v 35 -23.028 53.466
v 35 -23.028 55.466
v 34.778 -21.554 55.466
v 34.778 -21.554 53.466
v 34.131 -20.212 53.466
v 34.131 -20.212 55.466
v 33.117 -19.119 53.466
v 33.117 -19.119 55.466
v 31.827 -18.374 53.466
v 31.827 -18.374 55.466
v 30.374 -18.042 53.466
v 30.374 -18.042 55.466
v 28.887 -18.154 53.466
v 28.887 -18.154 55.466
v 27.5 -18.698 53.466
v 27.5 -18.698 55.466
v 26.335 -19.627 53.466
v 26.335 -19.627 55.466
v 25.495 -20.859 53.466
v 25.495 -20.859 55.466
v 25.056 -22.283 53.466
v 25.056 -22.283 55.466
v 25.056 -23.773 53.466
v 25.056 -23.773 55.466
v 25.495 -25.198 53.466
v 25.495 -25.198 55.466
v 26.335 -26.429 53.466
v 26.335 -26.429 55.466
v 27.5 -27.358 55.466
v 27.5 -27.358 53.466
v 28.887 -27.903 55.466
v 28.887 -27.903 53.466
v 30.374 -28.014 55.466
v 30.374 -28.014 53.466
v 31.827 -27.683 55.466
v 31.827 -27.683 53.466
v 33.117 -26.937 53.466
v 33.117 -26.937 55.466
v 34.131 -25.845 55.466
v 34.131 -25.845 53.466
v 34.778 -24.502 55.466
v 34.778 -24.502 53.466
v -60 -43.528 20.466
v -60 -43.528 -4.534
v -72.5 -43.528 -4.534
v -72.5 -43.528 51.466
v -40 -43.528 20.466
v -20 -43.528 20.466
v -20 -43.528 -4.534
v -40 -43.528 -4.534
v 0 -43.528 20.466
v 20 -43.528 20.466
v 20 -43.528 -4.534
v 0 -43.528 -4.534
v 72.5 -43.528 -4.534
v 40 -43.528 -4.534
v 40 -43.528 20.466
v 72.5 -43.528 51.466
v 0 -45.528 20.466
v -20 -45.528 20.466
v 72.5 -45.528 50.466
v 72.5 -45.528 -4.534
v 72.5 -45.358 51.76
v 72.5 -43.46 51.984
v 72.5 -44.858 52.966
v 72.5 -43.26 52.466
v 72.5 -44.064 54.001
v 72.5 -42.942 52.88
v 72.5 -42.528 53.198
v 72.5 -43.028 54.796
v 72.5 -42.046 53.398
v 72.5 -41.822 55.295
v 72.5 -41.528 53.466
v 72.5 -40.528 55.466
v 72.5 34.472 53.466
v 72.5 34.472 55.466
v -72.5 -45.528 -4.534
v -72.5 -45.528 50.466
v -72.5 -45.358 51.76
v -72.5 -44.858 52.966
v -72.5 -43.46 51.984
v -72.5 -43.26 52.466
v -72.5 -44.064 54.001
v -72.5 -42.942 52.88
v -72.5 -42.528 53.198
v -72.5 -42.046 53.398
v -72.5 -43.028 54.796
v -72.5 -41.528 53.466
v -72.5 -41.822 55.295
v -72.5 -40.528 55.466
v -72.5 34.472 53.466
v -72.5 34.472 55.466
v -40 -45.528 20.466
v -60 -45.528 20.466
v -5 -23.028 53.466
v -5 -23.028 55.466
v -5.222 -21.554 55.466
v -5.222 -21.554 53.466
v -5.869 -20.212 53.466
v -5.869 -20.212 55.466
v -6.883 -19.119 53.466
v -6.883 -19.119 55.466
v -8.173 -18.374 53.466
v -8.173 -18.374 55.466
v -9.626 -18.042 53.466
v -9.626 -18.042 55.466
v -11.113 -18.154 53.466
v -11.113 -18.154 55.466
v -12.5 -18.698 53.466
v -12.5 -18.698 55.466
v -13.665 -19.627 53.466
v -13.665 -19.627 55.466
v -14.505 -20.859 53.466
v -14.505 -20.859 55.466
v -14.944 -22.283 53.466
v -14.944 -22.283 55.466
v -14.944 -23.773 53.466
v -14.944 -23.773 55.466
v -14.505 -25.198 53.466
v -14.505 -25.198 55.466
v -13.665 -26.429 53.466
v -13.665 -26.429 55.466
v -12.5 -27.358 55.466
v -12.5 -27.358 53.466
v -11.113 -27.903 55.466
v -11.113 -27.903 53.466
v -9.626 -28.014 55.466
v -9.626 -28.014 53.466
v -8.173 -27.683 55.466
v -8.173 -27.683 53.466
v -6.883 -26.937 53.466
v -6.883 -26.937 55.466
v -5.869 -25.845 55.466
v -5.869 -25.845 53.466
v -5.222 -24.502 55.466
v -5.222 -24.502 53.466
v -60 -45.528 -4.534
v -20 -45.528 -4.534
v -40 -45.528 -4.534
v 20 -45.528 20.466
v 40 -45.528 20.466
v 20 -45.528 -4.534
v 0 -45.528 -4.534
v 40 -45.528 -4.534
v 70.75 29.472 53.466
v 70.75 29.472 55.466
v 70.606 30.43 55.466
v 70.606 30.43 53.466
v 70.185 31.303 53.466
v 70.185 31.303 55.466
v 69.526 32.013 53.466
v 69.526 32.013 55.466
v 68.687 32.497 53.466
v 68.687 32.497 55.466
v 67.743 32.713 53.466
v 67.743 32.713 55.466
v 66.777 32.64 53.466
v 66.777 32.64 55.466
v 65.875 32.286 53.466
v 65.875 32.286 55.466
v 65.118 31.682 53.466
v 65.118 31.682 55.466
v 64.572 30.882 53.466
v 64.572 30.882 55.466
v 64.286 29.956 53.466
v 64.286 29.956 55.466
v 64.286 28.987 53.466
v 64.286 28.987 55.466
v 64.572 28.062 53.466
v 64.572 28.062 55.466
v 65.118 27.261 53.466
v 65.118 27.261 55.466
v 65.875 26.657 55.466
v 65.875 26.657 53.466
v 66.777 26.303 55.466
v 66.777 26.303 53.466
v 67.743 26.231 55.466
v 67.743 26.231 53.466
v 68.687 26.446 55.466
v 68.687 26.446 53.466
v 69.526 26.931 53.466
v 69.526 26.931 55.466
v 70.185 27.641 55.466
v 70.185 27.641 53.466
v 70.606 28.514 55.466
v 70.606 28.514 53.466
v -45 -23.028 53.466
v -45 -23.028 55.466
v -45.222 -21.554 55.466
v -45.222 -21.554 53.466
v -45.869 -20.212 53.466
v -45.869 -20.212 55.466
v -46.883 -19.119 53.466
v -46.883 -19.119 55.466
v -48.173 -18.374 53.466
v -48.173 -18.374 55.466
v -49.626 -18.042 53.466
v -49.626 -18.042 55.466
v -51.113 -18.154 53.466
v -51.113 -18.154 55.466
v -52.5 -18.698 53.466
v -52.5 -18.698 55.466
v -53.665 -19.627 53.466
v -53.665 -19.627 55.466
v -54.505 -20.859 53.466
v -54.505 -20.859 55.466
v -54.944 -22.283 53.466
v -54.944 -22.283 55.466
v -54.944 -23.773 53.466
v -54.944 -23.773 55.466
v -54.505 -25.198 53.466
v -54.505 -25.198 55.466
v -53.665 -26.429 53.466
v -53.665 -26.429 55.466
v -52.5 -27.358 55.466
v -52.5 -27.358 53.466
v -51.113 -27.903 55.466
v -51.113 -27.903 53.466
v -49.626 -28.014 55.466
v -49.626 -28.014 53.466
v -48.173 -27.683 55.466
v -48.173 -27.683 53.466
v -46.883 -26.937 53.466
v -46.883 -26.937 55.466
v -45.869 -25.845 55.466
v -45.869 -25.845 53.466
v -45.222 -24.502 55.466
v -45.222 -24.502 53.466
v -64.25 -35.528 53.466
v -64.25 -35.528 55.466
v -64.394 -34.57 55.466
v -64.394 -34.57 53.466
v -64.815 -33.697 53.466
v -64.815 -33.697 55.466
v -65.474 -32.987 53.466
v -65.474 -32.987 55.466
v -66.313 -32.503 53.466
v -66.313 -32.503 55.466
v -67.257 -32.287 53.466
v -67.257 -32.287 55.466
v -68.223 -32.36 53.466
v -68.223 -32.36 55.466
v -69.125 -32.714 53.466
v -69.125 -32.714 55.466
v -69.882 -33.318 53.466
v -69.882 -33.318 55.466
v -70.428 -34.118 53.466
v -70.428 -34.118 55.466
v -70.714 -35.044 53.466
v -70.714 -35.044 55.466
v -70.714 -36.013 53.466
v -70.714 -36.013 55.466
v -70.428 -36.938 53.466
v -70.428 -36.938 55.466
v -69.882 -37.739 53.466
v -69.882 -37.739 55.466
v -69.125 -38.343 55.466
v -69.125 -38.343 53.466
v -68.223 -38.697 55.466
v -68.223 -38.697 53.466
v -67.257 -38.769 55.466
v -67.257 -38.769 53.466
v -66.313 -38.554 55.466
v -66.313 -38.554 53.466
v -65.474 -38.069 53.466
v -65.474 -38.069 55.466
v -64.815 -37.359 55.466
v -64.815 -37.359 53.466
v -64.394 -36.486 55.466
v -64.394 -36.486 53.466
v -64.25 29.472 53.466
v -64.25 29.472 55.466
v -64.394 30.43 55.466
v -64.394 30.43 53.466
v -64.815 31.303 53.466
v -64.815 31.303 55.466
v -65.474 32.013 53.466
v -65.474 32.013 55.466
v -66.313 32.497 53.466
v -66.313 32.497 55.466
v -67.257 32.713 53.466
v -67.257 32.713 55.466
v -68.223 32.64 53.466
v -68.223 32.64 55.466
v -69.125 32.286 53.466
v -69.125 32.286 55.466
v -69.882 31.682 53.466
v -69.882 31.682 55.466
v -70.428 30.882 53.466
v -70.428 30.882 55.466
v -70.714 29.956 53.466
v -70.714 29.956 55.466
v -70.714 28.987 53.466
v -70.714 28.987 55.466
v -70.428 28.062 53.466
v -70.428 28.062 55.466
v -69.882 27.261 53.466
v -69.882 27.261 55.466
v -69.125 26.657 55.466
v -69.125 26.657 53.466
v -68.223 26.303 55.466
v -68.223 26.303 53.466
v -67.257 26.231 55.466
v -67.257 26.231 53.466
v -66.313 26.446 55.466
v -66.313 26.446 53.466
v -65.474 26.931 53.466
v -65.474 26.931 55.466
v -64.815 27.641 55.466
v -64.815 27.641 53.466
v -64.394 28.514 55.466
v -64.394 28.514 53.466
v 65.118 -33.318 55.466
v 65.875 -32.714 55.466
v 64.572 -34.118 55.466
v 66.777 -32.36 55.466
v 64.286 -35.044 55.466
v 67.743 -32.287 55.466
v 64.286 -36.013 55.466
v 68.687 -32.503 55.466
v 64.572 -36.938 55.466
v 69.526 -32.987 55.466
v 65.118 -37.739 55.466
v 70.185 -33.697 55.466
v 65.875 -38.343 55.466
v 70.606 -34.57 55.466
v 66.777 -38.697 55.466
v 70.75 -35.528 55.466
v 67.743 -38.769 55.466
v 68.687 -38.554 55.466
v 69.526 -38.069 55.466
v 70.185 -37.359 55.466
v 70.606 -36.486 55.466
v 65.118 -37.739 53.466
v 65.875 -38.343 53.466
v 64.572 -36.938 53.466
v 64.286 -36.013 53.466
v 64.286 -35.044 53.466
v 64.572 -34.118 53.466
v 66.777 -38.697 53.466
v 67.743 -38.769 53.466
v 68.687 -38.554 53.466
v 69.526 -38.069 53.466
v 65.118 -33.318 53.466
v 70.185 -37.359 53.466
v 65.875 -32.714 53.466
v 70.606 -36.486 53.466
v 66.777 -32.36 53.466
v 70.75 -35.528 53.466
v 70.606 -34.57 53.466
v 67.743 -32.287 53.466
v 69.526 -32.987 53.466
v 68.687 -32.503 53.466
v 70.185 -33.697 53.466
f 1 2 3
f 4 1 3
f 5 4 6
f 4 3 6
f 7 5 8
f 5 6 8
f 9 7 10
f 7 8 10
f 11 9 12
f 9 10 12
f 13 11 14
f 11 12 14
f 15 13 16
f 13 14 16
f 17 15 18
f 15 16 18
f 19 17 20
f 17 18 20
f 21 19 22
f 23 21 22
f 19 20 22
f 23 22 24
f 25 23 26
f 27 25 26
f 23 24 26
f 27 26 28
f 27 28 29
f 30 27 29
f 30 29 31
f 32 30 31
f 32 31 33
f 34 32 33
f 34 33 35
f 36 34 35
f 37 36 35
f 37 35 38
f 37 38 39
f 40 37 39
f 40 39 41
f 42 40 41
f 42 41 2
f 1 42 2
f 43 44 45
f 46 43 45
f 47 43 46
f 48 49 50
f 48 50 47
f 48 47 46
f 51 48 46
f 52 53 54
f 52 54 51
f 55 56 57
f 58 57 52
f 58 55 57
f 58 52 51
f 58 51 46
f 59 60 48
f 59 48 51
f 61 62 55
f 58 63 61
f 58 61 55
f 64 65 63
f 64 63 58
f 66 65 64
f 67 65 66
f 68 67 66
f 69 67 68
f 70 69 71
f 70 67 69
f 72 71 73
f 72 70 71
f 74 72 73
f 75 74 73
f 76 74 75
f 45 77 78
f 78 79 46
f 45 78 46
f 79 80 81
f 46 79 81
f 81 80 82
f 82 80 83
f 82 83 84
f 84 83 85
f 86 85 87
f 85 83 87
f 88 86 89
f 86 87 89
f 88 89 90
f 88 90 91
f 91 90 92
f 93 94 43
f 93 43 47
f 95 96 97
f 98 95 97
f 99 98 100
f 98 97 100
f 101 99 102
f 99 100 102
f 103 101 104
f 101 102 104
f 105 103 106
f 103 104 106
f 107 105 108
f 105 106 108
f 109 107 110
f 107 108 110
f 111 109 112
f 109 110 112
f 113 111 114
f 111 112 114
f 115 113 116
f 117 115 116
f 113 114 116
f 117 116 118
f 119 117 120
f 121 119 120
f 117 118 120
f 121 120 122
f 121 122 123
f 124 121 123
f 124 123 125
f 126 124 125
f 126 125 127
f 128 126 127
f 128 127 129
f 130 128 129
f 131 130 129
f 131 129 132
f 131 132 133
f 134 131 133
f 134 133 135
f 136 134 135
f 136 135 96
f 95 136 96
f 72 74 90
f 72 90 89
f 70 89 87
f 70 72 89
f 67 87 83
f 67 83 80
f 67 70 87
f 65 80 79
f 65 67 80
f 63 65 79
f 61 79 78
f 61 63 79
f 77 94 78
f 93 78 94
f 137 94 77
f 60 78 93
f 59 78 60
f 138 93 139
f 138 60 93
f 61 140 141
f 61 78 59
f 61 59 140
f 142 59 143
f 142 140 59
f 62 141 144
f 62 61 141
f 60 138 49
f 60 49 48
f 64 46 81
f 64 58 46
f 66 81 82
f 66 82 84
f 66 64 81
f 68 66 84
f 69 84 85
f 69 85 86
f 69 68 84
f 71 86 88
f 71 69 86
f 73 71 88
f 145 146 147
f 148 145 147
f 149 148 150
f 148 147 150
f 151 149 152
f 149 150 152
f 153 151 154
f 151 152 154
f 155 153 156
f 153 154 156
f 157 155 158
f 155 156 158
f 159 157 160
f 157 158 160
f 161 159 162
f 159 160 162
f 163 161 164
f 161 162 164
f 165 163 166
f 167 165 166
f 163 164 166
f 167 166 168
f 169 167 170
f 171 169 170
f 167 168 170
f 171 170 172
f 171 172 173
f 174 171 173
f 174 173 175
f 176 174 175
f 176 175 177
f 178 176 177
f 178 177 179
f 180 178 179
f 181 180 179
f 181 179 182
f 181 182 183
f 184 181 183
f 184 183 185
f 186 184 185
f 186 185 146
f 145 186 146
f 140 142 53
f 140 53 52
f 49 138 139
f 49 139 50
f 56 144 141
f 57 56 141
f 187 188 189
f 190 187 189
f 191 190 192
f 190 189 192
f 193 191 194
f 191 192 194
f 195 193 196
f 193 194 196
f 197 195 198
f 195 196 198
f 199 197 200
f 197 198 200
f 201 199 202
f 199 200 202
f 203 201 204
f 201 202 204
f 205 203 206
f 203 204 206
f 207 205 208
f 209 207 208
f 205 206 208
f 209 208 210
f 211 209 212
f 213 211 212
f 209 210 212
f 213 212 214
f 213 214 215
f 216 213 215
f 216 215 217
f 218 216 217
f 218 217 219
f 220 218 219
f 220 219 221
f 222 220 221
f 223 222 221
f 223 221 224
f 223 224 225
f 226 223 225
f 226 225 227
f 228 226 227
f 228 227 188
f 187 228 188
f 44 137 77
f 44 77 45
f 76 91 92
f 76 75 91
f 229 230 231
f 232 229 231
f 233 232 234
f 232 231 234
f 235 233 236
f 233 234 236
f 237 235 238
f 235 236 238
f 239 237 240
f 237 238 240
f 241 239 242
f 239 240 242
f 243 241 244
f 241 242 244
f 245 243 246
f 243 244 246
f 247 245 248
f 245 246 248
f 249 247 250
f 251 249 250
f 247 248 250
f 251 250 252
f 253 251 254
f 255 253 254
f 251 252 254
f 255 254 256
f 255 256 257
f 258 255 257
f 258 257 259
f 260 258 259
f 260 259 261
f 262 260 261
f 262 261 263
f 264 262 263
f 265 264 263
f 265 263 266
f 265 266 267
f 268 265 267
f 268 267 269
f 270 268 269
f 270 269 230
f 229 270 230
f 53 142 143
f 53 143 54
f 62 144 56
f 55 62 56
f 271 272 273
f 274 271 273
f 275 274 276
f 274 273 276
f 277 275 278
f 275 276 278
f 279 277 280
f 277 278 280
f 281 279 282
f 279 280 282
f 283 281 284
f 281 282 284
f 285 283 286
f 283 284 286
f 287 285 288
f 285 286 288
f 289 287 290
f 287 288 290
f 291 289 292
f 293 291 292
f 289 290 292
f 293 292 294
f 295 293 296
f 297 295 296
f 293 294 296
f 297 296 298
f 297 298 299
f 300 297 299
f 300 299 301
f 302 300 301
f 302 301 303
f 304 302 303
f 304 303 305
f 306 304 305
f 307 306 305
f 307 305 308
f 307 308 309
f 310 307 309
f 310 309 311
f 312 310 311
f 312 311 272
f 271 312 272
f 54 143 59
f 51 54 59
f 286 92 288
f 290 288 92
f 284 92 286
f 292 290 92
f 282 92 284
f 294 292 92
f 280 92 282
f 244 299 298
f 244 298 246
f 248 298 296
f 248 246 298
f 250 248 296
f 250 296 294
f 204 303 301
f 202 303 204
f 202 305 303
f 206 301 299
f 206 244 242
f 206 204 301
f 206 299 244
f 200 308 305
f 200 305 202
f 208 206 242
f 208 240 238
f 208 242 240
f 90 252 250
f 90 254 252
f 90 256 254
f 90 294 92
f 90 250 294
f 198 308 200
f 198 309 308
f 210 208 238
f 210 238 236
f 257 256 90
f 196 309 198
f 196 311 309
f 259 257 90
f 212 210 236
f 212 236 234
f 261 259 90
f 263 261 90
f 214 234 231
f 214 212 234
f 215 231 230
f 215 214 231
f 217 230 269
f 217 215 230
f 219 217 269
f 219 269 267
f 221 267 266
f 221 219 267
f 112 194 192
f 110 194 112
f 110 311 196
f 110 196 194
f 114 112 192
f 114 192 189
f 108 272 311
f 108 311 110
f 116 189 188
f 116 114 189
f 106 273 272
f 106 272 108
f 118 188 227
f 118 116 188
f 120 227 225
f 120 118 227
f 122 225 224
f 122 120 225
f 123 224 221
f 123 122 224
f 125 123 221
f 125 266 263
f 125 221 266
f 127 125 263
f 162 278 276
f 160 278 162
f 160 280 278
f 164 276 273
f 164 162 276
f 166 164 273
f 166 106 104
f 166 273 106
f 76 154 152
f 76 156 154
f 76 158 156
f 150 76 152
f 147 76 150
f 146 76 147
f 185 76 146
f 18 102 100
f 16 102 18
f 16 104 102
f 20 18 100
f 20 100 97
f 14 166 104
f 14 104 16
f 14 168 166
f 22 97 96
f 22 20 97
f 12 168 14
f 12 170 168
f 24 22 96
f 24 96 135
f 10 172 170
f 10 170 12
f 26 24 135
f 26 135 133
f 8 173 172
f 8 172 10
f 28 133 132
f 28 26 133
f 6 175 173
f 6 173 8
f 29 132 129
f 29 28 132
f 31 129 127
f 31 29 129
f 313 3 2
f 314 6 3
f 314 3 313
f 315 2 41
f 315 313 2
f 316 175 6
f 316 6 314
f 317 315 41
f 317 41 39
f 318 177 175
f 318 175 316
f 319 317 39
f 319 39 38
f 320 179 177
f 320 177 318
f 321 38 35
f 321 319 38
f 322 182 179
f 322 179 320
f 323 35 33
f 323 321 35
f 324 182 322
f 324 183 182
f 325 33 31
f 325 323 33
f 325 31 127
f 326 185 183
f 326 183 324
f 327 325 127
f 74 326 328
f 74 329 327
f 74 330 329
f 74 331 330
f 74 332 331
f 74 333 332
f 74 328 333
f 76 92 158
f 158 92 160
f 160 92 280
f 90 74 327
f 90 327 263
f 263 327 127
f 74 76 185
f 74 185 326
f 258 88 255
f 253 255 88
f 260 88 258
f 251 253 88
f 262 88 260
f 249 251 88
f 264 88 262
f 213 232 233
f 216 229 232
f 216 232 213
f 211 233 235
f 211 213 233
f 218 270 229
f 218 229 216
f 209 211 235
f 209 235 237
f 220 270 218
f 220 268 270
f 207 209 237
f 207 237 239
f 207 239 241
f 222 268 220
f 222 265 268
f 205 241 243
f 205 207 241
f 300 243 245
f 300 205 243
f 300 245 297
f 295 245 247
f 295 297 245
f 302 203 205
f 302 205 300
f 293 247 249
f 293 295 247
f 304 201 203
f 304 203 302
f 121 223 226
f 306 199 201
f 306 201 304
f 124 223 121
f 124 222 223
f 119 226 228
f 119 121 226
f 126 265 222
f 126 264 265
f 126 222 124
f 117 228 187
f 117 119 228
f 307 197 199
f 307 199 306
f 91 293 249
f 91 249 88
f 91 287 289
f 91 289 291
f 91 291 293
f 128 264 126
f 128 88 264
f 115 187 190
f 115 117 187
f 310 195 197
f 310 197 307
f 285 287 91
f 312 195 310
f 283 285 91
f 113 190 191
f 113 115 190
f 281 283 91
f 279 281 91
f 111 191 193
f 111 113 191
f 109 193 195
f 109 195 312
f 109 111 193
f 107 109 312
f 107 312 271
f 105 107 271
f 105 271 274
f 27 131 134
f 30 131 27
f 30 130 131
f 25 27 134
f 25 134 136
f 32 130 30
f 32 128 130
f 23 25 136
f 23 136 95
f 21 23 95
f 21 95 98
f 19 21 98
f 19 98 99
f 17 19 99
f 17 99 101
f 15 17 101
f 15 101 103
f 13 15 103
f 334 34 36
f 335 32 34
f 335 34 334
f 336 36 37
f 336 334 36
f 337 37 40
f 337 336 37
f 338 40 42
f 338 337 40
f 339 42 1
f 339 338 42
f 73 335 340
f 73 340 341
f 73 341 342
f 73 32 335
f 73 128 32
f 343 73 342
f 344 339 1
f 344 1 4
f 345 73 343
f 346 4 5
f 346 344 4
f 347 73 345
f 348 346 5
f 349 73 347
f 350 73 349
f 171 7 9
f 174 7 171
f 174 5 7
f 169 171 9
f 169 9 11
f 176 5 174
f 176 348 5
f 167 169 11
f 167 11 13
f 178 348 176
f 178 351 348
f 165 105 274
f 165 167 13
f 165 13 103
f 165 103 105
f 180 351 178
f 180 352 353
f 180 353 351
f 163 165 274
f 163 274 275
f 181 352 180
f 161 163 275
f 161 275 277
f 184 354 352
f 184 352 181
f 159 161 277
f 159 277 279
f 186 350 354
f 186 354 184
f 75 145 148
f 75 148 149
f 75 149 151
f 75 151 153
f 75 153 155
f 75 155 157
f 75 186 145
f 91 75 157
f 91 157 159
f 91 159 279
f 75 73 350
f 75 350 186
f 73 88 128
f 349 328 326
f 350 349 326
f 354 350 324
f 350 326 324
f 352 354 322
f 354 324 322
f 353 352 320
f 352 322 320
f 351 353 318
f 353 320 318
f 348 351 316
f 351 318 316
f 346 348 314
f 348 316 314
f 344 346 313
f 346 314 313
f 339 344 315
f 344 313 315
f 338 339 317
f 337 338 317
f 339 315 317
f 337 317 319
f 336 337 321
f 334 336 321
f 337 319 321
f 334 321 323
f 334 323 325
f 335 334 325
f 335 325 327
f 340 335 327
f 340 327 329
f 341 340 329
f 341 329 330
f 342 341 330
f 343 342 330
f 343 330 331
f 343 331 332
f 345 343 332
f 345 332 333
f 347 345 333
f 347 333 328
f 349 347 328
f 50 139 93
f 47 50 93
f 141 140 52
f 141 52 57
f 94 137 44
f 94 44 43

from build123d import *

# Parameters (mm, degrees)
F1_DEPTH = 72.5
F2_W     = 20
F2_H     = 25
F3_DEPTH = 25
F4_R     = 5
F5_DEPTH = 25
F6_R     = 3.25
F7_DEPTH = 25


with BuildPart() as f1:
    # F0 (on Right) → F1 (new body, symmetric)
    with BuildSketch(Plane.YZ):
        with BuildLine():
            Line((34.471770674, 53.4658672512), (34.471770674, 55.4658672512))
            Line((34.471770674, 55.4658672512), (-40.528229326, 55.4658672512))
            ThreePointArc((-40.528229326, 55.4658672512), (-44.0637632319, 54.0014011571), (-45.528229326, 50.4658672512))
            Line((-45.528229326, 50.4658672512), (-45.528229326, -4.5341327488))
            Line((-45.528229326, -4.5341327488), (-43.528229326, -4.5341327488))
            Line((-43.528229326, -4.5341327488), (-43.528229326, 51.4658672512))
            ThreePointArc((-43.528229326, 51.4658672512), (-42.9424428884, 52.8800808135), (-41.528229326, 53.4658672512))
            Line((-41.528229326, 53.4658672512), (34.471770674, 53.4658672512))
        make_face()
    extrude(amount=F1_DEPTH, both=True)

    # F2 (on face) → F3 (cut)
    with BuildSketch(Plane.XZ.offset(45.528229326)):
        with Locations((-50, 7.9658672512)):
            Rectangle(F2_W, F2_H)
        with Locations((-10, 7.9658672512)):
            Rectangle(F2_W, F2_H)
        with Locations((30, 7.9658672512)):
            Rectangle(F2_W, F2_H)
    extrude(amount=-F3_DEPTH, mode=Mode.SUBTRACT)

    # F4 (on face) → F5 (cut)
    with BuildSketch(Plane.XY.offset(55.4658672512)):
        with Locations((-50, -23.028229326)):
            Circle(F4_R)
        with Locations((-10, -23.028229326)):
            Circle(F4_R)
        with Locations((30, -23.028229326)):
            Circle(F4_R)
    extrude(amount=-F5_DEPTH, mode=Mode.SUBTRACT)

    # F6 (on face) → F7 (cut)
    with BuildSketch(Plane.XY.offset(55.4658672512)):
        with Locations((-67.5, -35.528229326)):
            Circle(F6_R)
        with Locations((-67.5, 29.471770674)):
            Circle(F6_R)
        with Locations((67.5, 29.471770674)):
            Circle(F6_R)
        with Locations((67.5, -35.528229326)):
            Circle(F6_R)
    extrude(amount=-F7_DEPTH, mode=Mode.SUBTRACT)


solid = f1.part
